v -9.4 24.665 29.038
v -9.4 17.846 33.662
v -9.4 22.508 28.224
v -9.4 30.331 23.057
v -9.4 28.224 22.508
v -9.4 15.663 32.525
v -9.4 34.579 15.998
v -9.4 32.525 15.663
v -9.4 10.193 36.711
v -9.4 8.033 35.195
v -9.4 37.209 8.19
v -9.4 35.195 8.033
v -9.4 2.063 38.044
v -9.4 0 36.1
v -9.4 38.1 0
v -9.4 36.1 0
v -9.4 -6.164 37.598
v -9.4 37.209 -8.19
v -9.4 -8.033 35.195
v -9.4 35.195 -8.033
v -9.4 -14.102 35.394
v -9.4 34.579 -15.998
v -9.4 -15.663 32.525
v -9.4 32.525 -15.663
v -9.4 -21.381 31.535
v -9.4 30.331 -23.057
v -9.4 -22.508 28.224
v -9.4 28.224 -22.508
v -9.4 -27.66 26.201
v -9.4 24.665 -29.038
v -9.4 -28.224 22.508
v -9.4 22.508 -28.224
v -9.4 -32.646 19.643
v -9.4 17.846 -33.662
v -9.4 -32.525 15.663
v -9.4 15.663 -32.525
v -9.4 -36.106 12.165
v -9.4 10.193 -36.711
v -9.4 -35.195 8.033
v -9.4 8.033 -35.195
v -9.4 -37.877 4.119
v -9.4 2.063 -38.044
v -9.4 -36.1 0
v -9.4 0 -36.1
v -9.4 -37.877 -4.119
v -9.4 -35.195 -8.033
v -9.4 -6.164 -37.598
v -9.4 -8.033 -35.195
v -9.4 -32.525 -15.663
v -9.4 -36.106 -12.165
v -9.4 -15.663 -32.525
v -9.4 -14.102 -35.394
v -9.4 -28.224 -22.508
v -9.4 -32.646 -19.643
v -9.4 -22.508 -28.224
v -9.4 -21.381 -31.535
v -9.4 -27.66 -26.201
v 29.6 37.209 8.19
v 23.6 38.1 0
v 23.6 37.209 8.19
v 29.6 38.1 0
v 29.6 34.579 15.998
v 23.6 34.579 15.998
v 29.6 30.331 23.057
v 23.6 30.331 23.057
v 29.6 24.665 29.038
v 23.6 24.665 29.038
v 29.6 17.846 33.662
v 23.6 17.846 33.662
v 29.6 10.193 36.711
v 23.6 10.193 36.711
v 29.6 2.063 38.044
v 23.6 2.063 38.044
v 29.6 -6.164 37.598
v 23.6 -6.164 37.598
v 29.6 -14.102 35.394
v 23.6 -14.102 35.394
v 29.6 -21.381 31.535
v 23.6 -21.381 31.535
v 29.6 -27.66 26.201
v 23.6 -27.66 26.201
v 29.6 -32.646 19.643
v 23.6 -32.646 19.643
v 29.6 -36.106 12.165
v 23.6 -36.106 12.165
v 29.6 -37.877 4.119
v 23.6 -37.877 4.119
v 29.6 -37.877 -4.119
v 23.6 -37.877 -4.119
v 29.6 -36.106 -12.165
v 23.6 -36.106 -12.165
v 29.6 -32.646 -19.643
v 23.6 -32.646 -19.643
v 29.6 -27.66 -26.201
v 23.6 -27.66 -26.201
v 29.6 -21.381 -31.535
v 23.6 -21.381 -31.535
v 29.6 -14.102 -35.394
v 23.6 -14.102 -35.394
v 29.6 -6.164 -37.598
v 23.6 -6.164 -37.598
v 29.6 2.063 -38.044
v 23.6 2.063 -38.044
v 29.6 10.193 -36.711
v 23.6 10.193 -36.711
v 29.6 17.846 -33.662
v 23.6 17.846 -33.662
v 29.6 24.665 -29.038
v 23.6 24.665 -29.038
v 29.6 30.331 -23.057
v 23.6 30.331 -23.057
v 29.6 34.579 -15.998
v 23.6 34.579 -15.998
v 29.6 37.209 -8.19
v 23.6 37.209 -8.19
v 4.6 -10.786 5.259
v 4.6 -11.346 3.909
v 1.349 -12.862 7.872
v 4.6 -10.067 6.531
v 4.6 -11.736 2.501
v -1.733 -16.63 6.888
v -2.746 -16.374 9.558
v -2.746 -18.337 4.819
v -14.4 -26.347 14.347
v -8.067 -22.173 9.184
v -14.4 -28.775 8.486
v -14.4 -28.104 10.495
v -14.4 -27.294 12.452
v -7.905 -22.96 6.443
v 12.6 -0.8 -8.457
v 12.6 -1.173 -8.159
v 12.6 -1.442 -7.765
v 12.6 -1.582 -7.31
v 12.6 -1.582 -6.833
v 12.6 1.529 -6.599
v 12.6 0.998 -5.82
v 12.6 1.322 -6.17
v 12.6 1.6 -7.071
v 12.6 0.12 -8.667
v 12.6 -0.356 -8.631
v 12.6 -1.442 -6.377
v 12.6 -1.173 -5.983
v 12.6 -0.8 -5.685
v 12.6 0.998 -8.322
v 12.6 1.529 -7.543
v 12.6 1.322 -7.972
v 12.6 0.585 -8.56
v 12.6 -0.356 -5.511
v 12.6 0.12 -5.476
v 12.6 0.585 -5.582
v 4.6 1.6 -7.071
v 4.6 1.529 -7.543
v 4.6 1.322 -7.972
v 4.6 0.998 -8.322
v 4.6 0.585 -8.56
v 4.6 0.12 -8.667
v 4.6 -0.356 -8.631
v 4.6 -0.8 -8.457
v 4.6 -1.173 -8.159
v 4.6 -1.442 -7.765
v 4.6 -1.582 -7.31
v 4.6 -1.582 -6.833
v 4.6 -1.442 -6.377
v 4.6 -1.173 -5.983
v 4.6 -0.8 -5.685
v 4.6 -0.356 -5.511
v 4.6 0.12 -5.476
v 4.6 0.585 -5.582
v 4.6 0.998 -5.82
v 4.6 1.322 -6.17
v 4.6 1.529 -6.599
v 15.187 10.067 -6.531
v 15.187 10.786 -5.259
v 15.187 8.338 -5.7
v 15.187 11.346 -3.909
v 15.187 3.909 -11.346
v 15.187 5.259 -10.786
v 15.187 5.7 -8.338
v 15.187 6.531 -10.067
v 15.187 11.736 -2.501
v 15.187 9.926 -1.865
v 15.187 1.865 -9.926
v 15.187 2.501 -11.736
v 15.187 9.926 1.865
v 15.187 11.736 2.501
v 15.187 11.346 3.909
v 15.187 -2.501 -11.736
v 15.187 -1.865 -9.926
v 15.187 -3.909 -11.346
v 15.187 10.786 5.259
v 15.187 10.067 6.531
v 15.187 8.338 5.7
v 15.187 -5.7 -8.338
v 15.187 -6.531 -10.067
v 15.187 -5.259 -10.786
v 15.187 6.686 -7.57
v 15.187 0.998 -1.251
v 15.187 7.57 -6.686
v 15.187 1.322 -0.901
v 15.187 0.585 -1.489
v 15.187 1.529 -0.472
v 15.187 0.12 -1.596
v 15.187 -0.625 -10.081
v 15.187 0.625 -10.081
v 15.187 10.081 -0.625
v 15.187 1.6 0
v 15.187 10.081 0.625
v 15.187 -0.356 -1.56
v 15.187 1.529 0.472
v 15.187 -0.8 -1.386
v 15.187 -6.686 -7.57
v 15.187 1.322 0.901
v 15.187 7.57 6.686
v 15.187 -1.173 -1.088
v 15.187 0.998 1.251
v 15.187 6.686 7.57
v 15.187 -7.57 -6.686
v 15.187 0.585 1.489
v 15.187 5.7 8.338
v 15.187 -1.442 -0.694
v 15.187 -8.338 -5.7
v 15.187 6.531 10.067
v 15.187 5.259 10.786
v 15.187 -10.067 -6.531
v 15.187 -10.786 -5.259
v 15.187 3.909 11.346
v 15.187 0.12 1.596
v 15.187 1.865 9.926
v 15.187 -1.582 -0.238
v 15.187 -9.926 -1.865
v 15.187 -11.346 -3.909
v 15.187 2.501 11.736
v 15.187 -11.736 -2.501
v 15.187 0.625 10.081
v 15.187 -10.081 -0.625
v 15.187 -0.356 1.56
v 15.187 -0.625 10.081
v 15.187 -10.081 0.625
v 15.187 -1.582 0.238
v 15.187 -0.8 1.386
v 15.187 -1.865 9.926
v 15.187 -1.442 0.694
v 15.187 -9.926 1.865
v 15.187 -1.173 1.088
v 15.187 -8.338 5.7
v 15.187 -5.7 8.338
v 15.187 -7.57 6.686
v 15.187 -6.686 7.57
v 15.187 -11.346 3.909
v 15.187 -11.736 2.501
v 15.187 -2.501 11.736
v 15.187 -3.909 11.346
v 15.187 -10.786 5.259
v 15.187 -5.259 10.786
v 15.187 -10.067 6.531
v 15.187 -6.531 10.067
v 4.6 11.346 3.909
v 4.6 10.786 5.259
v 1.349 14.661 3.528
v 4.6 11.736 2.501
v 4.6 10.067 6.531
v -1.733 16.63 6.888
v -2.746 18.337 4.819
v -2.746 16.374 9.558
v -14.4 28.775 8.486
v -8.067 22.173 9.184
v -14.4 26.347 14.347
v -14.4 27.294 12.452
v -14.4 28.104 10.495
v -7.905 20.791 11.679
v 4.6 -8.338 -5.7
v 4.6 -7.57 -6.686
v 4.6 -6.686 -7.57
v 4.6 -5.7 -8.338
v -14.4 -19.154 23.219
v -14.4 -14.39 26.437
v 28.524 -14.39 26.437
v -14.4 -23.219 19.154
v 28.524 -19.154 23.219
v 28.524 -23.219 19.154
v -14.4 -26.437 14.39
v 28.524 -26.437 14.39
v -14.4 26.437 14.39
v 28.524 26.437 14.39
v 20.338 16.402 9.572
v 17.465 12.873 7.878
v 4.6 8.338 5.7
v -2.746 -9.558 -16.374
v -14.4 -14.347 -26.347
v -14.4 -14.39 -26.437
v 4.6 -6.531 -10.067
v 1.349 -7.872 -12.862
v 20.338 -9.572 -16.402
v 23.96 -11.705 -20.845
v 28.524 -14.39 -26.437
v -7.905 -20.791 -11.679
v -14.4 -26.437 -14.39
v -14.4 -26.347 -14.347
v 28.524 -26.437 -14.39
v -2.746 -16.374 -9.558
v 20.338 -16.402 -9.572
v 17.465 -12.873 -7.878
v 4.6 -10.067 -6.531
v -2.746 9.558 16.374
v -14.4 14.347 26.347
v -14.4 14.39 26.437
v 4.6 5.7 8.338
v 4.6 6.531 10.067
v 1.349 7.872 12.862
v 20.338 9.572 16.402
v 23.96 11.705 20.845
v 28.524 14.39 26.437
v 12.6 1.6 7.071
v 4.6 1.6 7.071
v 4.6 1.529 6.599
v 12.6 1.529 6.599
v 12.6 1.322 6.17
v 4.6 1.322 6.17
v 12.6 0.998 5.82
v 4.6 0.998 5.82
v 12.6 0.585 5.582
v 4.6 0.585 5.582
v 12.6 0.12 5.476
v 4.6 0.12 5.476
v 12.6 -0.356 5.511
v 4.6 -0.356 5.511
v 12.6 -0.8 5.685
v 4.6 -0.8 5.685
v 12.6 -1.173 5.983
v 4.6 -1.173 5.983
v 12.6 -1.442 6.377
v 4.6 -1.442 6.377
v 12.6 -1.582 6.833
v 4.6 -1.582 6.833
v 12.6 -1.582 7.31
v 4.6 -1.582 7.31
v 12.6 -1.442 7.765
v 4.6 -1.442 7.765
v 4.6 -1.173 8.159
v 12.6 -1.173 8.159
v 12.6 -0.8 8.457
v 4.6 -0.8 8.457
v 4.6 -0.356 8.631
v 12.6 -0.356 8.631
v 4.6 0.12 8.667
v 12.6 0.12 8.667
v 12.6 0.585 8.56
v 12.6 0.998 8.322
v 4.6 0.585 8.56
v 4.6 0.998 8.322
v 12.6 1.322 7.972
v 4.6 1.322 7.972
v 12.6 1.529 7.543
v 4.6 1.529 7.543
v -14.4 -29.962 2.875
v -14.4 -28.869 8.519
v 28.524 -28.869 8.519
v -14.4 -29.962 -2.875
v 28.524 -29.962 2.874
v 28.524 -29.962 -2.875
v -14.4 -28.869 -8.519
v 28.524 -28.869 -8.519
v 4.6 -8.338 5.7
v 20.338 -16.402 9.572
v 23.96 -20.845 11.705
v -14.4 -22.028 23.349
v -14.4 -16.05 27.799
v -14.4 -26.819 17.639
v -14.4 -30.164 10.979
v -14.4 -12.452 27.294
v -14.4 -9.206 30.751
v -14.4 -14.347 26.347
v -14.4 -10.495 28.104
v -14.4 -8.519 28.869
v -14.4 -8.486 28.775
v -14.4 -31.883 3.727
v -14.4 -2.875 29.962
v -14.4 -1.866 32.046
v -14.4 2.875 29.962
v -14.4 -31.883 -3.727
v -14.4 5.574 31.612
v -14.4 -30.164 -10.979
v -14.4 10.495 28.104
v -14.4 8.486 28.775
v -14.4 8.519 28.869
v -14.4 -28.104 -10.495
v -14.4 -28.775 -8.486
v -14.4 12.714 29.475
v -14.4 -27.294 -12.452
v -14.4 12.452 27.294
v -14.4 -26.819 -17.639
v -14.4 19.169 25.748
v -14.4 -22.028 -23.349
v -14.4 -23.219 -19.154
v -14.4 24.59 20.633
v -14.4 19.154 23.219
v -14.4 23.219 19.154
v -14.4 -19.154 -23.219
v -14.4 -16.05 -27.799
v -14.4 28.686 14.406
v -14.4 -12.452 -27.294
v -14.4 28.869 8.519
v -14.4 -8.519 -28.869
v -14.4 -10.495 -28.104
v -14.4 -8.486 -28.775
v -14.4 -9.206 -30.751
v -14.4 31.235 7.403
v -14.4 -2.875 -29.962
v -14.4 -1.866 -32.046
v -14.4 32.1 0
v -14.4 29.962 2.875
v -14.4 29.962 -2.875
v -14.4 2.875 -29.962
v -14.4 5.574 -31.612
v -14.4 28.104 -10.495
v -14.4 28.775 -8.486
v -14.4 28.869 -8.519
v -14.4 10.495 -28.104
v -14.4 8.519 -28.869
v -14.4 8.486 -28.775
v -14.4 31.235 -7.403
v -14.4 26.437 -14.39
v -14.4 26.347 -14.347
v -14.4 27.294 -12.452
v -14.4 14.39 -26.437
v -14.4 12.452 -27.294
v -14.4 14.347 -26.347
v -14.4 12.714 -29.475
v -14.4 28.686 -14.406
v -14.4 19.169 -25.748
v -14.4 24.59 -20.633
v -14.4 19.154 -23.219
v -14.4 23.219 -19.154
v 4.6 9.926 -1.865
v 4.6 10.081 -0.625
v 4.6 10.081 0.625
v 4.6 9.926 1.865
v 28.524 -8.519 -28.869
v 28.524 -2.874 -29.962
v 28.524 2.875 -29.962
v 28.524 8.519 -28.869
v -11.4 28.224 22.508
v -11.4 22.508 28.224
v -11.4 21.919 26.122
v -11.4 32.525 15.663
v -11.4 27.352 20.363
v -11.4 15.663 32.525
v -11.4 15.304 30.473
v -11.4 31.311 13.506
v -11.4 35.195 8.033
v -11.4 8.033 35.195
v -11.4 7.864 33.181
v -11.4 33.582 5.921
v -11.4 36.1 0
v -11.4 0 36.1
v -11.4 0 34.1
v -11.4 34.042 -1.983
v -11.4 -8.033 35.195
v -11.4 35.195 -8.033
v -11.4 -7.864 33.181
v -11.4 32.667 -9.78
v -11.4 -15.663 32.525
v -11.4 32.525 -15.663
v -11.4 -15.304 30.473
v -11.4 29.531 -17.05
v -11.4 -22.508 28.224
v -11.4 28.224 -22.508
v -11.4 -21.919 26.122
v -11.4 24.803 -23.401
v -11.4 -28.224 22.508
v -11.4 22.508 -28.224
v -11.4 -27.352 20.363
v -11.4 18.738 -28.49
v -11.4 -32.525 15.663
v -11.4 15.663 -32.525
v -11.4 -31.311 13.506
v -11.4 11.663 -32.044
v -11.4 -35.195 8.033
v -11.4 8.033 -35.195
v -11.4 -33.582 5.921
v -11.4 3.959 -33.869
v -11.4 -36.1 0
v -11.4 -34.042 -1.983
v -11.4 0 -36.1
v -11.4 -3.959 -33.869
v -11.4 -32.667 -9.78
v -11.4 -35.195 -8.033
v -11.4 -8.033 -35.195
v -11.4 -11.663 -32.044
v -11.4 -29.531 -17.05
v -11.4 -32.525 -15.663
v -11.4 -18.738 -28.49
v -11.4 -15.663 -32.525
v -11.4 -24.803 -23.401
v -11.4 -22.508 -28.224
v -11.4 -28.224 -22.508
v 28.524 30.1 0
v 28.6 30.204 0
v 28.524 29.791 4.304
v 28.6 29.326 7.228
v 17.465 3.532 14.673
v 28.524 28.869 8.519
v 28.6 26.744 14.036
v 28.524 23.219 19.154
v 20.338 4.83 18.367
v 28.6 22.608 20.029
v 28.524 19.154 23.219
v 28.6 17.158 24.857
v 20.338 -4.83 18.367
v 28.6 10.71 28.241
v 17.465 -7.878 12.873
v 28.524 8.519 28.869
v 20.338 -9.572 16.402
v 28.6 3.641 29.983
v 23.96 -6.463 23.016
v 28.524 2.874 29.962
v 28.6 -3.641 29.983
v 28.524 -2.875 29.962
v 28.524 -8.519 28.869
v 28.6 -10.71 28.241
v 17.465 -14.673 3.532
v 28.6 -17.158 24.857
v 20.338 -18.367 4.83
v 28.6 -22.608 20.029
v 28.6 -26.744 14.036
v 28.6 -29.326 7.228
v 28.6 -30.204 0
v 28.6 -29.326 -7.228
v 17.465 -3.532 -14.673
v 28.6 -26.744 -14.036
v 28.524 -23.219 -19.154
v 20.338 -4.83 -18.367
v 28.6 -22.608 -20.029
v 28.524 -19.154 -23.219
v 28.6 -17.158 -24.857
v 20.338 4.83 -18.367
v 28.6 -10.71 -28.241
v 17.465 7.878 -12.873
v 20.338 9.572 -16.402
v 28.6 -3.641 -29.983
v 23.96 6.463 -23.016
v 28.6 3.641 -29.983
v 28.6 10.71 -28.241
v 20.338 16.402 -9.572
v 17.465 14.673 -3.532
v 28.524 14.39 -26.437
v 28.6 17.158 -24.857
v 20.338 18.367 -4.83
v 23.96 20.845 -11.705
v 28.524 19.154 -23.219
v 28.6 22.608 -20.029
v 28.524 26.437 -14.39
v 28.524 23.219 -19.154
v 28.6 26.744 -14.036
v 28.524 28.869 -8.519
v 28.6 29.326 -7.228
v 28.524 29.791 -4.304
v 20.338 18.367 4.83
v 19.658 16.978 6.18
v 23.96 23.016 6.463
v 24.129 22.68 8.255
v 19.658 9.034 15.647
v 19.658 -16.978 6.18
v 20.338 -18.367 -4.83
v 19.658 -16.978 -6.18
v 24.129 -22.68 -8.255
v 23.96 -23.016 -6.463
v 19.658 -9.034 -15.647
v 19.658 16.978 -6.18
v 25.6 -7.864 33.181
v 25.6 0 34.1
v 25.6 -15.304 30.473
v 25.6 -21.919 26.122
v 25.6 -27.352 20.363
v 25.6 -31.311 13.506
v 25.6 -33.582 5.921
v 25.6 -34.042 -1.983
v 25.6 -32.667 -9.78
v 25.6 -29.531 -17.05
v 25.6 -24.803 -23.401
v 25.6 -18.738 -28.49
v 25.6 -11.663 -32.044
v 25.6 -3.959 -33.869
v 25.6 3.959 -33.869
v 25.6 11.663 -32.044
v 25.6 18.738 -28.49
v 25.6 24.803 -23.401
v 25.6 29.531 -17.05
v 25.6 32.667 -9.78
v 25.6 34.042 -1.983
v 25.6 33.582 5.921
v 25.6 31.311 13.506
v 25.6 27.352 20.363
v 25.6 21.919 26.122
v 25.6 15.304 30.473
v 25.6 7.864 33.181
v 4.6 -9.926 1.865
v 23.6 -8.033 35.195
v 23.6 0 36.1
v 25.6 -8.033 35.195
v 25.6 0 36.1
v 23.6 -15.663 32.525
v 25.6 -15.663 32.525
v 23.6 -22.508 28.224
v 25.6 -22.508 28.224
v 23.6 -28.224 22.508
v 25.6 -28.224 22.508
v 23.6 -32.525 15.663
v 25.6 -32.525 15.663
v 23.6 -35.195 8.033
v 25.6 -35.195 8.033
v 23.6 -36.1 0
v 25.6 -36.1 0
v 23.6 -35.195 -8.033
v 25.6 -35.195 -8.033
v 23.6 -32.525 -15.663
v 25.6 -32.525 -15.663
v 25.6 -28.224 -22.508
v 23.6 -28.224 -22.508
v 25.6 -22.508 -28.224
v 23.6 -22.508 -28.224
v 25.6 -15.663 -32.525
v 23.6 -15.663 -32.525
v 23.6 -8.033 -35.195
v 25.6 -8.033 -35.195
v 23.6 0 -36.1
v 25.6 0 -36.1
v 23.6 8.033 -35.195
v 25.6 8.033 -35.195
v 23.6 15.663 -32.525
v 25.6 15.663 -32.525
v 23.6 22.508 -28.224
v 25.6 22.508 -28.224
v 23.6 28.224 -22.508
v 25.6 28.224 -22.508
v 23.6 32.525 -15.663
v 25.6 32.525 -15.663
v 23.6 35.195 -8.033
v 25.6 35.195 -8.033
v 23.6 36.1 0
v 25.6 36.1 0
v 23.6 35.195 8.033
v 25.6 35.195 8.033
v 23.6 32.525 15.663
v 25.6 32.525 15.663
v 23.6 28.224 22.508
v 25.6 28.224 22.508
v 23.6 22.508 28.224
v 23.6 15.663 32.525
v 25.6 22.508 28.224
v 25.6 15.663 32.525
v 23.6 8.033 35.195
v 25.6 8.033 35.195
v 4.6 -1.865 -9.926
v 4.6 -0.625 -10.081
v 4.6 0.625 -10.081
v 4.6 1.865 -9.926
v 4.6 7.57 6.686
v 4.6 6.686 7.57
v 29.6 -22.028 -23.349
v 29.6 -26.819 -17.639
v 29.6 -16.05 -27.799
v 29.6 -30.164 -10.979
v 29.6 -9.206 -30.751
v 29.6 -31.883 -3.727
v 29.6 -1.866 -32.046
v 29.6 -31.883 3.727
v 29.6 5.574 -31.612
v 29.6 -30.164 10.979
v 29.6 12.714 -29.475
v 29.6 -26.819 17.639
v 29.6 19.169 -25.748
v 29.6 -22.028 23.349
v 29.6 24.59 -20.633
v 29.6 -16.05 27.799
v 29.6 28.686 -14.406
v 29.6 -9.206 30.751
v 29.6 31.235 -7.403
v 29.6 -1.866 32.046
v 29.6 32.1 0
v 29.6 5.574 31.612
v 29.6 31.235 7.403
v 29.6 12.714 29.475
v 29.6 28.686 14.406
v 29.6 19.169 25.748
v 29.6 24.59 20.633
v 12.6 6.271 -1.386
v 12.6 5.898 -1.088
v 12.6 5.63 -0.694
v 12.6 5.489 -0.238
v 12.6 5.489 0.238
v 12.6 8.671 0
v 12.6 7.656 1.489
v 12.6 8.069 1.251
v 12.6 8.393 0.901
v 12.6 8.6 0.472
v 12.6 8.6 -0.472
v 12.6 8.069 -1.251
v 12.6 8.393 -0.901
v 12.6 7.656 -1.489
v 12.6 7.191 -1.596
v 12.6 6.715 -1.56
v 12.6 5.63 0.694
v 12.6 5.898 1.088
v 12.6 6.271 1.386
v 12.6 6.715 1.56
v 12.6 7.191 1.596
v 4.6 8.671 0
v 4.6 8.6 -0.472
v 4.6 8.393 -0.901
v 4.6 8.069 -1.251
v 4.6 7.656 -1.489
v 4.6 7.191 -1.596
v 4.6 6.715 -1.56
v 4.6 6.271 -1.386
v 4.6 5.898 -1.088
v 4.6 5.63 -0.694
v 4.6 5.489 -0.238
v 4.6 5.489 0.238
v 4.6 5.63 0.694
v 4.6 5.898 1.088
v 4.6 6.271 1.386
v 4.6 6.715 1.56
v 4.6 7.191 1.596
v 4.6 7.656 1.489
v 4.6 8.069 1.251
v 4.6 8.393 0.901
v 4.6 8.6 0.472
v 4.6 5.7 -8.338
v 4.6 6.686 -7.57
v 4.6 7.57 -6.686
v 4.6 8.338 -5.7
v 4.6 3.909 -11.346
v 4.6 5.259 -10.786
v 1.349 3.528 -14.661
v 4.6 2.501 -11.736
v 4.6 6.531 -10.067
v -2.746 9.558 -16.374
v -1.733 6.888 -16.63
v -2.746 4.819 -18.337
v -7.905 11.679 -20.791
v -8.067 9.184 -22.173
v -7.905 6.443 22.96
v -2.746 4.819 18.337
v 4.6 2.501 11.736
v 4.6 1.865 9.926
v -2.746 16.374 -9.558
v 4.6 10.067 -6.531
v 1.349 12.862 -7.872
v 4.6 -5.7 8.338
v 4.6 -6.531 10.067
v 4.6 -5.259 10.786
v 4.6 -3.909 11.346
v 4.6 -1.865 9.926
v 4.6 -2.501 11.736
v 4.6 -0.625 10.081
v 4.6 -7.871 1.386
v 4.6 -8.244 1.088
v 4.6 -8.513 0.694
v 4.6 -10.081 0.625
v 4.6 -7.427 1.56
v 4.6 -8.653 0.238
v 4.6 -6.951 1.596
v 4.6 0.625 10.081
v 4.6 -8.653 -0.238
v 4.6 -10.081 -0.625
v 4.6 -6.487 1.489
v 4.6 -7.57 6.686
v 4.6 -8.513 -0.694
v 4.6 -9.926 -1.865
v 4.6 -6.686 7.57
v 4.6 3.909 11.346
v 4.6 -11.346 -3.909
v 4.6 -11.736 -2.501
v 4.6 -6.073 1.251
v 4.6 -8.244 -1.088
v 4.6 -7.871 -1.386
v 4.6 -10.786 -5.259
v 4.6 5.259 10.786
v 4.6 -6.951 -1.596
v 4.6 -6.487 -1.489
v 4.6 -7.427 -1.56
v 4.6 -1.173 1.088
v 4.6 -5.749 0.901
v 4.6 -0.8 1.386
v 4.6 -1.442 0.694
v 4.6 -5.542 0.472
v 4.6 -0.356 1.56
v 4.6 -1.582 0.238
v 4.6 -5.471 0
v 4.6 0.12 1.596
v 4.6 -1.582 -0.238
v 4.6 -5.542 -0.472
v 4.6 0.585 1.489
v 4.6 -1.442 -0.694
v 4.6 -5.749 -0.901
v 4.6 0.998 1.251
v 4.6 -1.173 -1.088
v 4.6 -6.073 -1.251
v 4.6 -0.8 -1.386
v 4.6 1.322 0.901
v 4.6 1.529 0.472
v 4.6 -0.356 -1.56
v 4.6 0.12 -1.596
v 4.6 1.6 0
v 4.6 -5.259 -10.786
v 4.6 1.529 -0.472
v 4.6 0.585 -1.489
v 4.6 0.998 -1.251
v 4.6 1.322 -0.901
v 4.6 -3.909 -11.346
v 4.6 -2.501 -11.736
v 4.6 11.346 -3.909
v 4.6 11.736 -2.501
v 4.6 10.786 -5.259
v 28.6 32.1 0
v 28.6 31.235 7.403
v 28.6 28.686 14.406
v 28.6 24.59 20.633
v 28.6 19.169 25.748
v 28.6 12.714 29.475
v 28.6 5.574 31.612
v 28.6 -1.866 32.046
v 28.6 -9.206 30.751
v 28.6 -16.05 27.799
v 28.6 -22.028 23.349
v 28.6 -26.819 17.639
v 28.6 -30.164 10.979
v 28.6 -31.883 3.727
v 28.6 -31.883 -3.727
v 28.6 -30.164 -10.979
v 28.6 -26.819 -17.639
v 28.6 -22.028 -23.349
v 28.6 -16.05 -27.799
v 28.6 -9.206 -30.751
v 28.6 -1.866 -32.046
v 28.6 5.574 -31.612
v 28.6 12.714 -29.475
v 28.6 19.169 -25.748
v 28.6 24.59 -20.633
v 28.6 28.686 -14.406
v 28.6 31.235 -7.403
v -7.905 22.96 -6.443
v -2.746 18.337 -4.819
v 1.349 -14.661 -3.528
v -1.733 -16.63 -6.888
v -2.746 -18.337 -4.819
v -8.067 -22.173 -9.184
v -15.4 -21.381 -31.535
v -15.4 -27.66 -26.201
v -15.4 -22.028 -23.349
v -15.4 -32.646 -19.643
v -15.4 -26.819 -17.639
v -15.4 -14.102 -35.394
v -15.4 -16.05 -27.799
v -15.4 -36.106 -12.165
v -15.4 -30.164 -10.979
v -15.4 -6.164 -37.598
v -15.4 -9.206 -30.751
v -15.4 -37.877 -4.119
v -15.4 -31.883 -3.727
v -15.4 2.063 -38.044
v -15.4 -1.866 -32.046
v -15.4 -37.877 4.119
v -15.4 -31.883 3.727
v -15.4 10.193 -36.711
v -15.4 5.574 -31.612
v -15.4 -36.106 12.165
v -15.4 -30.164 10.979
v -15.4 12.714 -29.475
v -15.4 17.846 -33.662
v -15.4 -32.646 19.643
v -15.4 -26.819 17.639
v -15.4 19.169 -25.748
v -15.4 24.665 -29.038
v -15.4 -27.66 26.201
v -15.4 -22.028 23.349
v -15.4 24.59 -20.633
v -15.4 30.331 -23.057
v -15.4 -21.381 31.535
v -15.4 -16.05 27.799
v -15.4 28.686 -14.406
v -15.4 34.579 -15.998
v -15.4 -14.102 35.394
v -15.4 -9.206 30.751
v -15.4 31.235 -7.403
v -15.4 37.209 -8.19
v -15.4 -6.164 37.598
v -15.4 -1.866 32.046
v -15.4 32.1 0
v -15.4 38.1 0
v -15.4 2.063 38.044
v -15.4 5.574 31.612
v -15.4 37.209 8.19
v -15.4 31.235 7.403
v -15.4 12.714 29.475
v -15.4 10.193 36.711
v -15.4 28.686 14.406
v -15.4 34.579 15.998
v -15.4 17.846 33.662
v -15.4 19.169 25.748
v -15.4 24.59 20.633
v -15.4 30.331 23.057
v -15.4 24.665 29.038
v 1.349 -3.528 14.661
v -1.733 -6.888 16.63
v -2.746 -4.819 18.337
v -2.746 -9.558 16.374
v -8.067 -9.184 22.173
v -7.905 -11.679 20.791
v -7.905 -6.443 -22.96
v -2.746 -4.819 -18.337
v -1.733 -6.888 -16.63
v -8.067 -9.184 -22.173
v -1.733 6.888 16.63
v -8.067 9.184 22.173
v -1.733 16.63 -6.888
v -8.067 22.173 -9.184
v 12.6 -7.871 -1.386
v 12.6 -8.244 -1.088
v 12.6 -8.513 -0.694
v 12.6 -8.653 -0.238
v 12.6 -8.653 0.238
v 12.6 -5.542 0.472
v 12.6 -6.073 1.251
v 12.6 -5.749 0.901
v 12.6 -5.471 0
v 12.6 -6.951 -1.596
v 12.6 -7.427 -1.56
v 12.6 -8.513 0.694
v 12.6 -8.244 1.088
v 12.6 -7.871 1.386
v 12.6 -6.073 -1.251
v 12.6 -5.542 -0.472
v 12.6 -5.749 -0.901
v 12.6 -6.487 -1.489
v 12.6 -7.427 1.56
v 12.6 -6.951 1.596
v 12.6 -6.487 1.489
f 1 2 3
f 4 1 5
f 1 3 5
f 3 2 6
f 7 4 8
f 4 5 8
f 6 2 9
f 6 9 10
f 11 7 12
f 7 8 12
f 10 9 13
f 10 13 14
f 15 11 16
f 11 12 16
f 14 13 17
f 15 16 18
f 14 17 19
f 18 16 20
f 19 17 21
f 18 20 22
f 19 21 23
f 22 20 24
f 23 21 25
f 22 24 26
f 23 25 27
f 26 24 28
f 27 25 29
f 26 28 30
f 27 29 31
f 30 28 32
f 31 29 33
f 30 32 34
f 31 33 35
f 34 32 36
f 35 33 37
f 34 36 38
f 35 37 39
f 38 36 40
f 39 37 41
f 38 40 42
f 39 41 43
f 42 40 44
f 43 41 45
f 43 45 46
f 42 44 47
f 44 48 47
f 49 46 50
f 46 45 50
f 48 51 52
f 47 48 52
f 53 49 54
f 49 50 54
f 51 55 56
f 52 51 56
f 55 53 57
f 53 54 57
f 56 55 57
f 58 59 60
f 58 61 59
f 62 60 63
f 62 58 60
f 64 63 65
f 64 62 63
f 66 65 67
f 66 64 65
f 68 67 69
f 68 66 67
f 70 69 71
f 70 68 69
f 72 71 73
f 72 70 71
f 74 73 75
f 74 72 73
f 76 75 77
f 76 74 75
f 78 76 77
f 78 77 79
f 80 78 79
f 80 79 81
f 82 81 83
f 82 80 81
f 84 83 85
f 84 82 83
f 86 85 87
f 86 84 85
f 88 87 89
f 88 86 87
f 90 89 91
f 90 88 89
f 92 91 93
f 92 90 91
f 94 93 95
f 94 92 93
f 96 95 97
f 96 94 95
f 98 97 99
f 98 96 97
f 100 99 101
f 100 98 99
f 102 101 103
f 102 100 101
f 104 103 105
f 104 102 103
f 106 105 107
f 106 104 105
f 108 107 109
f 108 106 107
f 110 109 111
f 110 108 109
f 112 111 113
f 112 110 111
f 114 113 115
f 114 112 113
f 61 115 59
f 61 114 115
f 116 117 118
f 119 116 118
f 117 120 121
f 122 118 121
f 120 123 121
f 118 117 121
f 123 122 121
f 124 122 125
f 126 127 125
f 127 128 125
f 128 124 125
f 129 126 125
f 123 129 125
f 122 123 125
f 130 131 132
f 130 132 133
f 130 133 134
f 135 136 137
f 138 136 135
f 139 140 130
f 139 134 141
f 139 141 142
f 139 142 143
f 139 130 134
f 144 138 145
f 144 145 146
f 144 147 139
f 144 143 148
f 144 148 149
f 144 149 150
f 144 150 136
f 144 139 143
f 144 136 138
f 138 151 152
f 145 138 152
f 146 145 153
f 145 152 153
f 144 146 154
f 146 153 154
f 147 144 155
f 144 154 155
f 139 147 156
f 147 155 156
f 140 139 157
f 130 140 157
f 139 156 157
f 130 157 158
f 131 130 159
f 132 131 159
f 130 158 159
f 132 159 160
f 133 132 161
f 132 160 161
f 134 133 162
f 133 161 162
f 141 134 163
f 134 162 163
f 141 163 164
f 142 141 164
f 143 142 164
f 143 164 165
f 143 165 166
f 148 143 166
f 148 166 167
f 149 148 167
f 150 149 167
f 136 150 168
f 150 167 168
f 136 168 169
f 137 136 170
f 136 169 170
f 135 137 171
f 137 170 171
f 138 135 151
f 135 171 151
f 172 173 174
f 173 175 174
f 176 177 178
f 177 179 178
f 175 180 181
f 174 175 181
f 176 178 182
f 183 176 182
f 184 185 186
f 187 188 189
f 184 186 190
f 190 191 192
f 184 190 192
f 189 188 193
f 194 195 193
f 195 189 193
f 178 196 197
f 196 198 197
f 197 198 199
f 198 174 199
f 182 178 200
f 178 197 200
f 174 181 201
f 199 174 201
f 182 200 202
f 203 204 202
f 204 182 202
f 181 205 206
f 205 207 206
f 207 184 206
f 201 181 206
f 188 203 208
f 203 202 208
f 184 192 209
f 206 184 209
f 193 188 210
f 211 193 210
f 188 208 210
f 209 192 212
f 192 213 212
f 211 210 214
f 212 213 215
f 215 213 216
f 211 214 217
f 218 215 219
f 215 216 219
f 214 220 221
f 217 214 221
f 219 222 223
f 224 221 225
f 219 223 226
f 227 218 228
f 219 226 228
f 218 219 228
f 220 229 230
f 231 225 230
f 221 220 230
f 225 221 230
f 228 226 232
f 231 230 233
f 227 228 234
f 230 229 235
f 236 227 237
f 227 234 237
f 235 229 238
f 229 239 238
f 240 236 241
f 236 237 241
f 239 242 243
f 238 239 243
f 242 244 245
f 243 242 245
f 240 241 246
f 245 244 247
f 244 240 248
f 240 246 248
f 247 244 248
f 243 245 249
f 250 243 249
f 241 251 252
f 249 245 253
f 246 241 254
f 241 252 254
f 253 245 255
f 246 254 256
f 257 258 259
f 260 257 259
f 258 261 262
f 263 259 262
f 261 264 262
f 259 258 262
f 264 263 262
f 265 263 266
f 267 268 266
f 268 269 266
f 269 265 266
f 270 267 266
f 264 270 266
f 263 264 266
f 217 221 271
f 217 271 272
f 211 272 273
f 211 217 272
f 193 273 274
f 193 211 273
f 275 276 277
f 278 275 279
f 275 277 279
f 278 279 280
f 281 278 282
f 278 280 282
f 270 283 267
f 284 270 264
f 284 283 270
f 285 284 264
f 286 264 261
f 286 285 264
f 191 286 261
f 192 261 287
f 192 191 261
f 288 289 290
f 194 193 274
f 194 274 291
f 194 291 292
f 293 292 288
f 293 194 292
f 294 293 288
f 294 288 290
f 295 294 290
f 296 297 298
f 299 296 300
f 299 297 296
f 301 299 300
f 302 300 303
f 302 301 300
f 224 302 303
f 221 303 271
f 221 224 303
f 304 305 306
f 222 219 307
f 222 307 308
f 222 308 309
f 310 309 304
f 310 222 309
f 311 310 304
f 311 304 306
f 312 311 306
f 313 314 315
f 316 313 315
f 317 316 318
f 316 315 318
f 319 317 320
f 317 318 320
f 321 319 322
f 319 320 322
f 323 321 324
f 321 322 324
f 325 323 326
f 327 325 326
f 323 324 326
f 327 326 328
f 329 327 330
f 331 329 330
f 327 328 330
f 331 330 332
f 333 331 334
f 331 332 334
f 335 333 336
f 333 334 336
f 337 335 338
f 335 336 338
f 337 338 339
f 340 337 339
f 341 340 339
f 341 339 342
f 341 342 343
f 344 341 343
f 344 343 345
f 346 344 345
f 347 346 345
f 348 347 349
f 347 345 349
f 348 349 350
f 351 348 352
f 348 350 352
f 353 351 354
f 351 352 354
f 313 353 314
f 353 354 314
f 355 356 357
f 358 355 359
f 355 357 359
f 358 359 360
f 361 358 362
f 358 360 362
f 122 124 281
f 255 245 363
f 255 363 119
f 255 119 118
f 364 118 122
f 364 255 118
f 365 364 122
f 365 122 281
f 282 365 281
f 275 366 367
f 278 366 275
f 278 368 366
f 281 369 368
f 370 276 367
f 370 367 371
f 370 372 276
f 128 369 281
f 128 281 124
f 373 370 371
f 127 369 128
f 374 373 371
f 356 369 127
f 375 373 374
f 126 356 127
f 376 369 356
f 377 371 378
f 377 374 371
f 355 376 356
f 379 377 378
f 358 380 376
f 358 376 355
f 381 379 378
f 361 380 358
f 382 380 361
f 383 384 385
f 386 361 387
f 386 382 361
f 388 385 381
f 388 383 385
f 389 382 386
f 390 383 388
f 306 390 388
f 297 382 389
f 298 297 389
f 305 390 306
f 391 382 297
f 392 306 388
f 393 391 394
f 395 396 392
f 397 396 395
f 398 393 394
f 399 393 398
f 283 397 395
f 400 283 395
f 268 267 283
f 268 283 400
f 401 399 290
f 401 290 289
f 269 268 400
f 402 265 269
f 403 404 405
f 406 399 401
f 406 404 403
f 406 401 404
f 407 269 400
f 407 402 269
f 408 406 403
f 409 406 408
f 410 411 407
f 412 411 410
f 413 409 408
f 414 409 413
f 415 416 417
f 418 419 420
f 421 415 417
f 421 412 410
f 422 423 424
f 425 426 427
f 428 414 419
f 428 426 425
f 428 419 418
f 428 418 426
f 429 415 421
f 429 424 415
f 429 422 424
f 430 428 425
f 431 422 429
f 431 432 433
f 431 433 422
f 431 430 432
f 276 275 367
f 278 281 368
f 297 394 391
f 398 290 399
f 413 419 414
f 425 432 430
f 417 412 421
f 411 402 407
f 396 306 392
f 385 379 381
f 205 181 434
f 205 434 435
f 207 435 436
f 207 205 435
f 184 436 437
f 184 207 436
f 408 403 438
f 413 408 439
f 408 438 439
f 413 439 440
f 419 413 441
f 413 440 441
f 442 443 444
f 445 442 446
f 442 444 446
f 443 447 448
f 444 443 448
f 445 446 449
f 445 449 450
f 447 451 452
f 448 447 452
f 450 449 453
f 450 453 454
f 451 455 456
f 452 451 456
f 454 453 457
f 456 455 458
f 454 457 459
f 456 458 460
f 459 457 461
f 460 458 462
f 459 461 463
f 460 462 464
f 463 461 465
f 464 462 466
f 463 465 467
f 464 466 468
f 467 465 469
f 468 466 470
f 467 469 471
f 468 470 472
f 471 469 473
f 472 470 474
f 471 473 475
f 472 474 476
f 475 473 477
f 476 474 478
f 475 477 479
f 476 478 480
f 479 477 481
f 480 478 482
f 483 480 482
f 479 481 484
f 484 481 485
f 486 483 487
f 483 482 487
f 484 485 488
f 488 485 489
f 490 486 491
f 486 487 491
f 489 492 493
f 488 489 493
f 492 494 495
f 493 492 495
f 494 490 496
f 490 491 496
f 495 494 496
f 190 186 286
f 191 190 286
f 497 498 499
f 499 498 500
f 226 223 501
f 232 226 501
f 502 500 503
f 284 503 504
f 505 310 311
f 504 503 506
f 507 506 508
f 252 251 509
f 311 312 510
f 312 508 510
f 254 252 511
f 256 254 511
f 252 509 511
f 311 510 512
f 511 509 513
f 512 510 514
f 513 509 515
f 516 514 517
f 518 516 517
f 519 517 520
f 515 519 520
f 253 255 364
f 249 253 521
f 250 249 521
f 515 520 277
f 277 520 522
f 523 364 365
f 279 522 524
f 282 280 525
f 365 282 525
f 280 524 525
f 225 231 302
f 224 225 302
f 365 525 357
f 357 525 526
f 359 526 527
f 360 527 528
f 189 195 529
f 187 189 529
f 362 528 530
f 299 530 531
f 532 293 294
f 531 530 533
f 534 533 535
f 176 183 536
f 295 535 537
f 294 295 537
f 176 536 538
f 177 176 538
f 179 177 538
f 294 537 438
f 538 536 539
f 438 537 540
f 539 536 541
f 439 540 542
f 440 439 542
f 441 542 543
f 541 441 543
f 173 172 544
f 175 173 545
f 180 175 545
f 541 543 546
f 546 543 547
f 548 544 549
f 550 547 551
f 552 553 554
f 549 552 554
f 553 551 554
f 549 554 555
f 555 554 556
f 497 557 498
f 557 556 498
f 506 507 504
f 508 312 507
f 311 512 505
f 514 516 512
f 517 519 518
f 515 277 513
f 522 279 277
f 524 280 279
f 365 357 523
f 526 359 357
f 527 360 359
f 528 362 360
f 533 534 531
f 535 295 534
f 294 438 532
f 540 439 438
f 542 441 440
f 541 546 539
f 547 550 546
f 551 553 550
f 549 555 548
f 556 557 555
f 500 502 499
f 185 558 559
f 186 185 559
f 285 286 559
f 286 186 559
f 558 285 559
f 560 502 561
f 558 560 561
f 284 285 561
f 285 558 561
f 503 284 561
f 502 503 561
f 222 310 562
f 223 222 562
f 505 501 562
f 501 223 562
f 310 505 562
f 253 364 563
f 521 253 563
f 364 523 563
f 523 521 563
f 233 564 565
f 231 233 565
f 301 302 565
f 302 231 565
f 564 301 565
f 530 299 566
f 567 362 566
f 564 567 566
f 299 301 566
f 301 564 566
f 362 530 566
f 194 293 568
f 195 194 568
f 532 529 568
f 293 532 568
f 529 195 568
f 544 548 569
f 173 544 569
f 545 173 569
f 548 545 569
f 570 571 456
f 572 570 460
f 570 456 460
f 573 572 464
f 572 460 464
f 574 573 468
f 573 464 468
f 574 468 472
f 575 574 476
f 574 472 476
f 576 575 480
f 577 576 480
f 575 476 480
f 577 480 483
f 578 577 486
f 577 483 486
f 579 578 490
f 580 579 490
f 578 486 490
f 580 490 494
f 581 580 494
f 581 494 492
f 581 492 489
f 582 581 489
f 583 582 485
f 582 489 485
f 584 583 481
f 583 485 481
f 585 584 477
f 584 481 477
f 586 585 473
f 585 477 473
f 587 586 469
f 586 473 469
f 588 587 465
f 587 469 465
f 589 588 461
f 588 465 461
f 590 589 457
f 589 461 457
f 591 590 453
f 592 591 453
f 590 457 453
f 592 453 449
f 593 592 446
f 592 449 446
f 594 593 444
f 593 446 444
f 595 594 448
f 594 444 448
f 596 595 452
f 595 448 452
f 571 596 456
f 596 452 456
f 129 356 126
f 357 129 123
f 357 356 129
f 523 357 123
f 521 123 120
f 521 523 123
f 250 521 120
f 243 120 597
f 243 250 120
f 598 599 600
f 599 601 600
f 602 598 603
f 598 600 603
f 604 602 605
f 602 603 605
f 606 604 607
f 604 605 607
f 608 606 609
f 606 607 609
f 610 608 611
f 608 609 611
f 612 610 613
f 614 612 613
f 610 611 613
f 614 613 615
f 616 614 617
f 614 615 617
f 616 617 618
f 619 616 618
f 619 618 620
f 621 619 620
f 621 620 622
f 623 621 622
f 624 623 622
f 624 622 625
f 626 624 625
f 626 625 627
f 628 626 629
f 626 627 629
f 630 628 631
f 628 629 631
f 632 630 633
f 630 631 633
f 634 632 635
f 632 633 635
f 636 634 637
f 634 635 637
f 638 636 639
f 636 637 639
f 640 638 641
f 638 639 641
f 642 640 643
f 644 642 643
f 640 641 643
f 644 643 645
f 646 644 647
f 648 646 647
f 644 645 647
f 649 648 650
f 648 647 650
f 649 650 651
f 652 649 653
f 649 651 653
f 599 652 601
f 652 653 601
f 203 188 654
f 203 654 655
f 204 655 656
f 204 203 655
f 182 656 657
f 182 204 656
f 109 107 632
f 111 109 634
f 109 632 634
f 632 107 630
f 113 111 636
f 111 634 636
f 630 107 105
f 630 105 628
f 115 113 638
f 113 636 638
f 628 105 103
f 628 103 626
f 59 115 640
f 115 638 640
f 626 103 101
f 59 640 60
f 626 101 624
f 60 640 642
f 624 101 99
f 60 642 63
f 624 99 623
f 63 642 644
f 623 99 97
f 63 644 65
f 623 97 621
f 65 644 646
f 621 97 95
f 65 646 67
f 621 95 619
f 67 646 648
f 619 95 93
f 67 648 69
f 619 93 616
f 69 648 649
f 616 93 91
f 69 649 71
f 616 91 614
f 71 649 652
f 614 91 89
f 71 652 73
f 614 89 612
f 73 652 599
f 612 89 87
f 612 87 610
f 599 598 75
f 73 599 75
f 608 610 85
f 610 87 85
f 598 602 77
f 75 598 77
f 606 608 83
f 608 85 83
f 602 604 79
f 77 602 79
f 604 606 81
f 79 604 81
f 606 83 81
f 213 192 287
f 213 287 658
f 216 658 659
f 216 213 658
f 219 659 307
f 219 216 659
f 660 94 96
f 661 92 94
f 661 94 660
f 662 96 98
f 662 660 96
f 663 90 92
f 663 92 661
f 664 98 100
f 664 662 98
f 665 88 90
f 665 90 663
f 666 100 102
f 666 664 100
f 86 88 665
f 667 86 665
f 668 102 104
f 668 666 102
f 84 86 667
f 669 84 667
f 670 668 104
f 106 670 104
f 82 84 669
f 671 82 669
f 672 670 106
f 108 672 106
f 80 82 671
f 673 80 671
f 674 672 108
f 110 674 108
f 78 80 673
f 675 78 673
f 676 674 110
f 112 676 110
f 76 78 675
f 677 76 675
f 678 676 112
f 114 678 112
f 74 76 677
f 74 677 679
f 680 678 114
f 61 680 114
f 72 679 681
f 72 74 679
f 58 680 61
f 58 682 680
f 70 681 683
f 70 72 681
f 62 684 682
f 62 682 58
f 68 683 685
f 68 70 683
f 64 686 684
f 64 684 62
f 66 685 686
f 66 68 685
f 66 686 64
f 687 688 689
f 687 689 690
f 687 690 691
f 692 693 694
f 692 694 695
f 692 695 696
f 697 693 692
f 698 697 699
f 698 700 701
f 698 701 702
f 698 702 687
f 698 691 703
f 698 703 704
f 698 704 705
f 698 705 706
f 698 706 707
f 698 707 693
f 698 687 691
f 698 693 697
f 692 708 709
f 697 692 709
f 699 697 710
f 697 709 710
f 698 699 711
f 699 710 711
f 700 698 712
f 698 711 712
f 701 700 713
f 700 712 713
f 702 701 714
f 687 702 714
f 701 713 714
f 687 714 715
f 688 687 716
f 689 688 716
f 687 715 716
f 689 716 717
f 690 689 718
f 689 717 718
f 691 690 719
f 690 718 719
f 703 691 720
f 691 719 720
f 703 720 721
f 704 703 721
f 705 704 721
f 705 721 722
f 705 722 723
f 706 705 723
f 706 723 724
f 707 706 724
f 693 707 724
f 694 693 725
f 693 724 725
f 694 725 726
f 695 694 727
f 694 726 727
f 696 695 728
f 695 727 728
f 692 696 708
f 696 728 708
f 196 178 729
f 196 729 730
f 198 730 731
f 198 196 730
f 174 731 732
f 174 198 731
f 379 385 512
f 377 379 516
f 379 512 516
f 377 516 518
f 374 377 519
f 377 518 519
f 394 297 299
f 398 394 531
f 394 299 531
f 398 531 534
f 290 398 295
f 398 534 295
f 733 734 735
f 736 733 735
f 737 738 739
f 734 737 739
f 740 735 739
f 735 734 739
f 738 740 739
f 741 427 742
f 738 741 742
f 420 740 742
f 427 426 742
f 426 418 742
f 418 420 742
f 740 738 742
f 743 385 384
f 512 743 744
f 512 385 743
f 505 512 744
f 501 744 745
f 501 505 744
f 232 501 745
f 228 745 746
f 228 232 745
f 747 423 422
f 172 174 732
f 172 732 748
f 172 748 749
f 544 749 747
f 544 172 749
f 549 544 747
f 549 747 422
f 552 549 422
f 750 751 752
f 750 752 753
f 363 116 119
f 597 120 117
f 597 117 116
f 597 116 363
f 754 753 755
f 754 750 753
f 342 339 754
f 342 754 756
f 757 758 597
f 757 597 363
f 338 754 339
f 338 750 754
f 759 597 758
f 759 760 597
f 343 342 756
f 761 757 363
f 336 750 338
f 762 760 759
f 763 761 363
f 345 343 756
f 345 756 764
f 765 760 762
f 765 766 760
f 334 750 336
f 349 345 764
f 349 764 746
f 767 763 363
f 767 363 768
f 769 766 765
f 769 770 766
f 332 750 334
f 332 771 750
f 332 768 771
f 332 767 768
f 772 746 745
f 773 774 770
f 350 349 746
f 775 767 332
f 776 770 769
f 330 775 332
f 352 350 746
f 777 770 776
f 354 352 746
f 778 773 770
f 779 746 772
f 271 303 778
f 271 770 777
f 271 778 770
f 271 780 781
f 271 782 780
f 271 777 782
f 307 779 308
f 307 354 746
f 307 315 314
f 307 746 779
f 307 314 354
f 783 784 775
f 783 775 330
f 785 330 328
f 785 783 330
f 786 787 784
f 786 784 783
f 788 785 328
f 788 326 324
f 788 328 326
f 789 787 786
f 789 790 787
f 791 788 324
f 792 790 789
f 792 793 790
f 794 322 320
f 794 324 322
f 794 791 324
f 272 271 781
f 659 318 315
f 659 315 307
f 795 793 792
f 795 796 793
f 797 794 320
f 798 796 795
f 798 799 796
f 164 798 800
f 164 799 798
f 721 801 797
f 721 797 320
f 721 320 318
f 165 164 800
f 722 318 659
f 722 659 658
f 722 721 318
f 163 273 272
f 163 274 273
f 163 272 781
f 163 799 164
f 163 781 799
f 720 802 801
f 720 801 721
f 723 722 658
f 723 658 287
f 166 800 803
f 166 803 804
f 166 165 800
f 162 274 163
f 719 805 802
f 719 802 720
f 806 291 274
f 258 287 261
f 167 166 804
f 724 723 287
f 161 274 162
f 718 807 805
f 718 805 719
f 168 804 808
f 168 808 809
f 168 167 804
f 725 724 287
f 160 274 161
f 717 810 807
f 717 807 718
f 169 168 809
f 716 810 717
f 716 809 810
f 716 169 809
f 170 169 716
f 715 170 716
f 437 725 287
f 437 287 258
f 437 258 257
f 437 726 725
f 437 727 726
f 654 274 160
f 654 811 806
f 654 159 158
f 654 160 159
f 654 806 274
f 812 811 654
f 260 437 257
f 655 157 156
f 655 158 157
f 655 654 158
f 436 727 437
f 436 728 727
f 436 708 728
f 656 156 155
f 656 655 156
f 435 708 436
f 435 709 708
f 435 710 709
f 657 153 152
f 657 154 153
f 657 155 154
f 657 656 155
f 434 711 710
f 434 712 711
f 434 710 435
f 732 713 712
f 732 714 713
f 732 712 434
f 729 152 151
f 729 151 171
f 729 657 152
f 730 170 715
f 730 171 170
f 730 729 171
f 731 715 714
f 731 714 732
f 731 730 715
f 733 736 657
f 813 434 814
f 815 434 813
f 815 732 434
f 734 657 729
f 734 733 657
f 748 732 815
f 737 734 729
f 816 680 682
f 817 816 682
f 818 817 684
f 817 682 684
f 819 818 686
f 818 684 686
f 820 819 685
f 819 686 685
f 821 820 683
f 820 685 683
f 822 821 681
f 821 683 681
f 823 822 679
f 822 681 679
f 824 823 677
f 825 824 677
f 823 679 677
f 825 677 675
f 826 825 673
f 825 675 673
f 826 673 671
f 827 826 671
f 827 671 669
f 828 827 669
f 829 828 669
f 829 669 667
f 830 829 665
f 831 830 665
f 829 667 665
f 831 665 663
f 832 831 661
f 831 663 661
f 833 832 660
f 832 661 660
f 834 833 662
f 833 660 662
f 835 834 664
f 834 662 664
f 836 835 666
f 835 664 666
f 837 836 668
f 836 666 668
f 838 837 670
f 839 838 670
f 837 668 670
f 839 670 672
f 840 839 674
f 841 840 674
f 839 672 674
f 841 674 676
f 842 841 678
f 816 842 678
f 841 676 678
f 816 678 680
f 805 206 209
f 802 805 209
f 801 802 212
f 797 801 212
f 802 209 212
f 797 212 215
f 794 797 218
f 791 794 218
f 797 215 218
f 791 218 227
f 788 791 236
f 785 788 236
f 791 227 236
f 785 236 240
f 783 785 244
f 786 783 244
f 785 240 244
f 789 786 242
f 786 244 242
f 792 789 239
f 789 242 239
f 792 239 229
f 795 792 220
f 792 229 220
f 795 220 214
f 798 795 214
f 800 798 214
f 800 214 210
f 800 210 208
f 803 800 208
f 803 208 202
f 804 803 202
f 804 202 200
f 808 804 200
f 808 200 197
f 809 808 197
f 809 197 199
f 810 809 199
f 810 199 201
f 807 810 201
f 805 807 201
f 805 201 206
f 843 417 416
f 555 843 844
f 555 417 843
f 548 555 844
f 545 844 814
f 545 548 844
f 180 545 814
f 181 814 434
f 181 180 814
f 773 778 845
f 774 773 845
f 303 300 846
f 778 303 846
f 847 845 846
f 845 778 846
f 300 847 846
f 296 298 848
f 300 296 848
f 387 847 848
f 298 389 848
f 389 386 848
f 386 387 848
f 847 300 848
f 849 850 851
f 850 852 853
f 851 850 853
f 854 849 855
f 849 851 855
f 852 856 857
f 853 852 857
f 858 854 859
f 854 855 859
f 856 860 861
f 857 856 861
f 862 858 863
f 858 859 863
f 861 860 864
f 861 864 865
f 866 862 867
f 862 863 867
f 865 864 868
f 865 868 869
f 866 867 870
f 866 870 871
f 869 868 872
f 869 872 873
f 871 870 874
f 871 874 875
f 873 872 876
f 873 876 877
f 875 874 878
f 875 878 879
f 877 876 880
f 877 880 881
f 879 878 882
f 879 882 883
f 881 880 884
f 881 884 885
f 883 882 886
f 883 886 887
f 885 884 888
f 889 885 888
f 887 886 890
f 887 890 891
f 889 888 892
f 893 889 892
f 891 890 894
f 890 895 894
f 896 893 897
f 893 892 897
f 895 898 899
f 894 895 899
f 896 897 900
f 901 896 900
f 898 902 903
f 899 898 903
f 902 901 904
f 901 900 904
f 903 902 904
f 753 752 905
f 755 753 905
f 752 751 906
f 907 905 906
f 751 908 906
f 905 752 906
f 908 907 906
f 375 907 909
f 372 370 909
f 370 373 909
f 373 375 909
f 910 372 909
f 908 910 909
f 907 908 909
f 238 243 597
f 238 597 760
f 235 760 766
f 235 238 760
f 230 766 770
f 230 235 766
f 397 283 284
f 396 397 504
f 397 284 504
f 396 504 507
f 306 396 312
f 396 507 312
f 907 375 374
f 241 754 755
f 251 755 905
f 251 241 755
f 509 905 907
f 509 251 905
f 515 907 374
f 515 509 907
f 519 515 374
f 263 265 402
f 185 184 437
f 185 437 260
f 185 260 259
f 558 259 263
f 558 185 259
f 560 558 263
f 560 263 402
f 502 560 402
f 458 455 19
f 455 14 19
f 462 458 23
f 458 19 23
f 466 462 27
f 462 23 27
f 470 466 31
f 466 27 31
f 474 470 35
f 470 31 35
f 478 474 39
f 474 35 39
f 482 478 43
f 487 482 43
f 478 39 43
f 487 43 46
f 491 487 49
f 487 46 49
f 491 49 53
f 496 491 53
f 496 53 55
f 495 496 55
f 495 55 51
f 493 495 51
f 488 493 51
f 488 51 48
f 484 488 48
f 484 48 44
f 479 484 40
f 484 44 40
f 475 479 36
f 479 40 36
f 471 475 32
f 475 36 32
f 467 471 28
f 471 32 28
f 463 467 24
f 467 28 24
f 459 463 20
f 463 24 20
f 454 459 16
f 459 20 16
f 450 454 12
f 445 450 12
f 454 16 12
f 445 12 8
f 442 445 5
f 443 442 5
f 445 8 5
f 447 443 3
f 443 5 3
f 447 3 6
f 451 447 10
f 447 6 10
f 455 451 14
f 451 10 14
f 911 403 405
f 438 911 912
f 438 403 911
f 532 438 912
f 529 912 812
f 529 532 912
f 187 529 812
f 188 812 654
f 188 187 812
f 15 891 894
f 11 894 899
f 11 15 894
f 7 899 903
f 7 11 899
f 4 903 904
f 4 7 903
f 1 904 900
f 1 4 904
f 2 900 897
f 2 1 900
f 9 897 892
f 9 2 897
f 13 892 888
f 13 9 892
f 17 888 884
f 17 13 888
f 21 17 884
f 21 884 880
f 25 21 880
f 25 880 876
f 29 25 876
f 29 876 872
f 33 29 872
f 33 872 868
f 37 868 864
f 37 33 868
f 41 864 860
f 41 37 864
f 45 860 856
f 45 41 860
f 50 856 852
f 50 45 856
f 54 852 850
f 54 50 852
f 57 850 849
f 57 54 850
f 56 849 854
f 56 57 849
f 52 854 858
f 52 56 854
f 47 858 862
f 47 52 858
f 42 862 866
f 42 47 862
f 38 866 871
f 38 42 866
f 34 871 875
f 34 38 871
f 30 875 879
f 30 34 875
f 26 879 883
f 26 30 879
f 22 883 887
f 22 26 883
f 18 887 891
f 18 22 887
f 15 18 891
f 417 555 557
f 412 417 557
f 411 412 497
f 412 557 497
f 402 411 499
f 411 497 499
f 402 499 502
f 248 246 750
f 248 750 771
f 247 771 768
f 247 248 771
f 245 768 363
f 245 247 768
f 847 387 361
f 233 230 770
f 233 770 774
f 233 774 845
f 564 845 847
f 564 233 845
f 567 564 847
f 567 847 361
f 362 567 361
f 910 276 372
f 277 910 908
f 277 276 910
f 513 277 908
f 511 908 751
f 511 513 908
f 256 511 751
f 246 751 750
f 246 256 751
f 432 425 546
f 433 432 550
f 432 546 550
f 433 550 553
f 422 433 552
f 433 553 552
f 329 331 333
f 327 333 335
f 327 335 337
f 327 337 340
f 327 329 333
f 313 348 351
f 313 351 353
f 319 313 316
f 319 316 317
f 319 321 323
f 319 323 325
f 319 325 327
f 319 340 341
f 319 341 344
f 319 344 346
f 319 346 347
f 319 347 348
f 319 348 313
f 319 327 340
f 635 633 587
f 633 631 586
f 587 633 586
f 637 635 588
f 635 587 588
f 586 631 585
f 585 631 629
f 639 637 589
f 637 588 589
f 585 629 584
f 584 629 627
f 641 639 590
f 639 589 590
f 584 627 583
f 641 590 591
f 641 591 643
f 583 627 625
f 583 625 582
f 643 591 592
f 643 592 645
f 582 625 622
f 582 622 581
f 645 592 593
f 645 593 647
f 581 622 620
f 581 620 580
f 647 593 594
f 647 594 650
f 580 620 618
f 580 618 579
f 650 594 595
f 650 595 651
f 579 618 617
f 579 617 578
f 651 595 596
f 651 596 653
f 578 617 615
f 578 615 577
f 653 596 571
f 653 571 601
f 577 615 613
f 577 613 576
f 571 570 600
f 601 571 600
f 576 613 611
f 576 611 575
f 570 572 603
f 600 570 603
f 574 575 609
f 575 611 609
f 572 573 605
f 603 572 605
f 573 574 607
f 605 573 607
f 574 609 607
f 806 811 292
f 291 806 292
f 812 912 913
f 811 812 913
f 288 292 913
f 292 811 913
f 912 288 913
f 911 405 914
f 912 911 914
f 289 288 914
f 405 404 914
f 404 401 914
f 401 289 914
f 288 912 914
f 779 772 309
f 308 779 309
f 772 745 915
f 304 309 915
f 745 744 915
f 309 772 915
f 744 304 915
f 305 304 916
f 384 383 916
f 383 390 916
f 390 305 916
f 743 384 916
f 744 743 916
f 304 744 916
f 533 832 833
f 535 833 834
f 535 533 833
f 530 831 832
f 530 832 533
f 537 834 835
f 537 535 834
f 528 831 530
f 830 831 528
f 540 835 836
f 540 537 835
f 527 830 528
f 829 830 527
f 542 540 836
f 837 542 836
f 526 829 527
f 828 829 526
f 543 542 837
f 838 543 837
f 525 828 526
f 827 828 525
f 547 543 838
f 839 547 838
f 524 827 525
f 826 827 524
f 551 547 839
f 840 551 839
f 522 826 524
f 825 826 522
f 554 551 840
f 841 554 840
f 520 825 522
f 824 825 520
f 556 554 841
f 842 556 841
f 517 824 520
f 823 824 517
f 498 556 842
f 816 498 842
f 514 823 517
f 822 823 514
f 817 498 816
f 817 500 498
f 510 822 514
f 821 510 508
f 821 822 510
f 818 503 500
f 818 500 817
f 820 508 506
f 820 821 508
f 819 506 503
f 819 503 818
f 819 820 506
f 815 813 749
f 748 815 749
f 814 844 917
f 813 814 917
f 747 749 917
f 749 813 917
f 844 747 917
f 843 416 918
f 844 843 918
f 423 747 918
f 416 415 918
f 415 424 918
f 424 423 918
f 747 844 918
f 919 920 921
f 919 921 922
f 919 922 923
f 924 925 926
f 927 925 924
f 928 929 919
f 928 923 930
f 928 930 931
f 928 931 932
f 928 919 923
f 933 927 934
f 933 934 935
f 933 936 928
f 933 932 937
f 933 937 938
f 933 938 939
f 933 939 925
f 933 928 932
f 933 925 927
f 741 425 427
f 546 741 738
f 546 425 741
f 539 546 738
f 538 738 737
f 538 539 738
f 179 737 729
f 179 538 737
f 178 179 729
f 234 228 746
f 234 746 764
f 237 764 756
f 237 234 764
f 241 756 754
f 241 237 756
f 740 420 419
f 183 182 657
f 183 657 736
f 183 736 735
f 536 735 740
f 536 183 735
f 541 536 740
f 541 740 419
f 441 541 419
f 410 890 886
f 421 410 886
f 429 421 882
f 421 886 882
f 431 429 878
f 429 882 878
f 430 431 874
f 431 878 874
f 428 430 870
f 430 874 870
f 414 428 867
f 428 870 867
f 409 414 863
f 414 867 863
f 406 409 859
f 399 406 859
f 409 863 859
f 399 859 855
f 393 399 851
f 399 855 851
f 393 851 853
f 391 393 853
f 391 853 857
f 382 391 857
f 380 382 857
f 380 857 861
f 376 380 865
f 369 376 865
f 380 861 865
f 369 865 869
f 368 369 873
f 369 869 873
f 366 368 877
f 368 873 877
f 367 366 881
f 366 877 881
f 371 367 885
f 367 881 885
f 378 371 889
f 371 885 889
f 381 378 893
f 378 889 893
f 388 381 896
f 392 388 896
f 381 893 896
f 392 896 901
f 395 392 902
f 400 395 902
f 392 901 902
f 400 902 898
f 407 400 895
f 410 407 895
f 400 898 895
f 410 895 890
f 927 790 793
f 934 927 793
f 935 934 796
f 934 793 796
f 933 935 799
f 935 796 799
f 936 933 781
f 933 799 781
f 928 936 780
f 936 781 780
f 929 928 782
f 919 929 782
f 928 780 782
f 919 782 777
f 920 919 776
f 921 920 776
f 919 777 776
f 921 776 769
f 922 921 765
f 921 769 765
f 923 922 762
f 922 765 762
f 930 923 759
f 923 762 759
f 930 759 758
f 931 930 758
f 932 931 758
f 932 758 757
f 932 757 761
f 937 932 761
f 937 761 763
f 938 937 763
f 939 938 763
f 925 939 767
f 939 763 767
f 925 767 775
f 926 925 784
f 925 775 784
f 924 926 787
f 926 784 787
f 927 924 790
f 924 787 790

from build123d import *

# Parameters (mm, degrees)
SKETCH027_R          = 38.1
PAD009_DEPTH         = 22.5
POCKET015_DEPTH      = 278.563668
POCKET015_DEPTH_BACK = -233.563668
POLARPATTERN_COUNT   = 8
SKETCH029_R          = 1.6
POCKET016_DEPTH      = 45.001
POCKET016_DEPTH_BACK = -0.001
SKETCH030_R          = 32.1
POCKET017_DEPTH      = 1
SKETCH031_R          = 12
POCKET018_DEPTH      = 19
SKETCH034_R          = 32.1
POCKET019_DEPTH      = 1
SKETCH035_R          = 8
POCKET020_DEPTH      = 13
SKETCH069_R          = 1.6
POCKET040_DEPTH      = 8


with BuildPart() as part:
    # Sketch027 → Pad009 (new body, symmetric)
    with BuildSketch(Plane.YZ):
        Circle(SKETCH027_R)
    extrude(amount=PAD009_DEPTH, both=True)

    # Sketch028 (on Face3 of Pad009) → Pocket015 (cut, two sides)
    with BuildSketch(Plane.YZ.offset(22.5)) as pocket015_sk:
        with BuildLine():
            ThreePointArc((1.865103, 9.926298), (0, 10.1), (-1.865103, 9.926298))
            Line((-1.865103, 9.926298), (-8.518771, 28.86937))
            ThreePointArc((8.518771, 28.86937), (0, 30.1), (-8.518771, 28.86937))
            Line((8.518771, 28.86937), (1.865103, 9.926298))
        make_face()
    pocket015 = extrude(amount=-POCKET015_DEPTH, mode=Mode.SUBTRACT)
    extrude(pocket015_sk.sketch, amount=-POCKET015_DEPTH_BACK, mode=Mode.SUBTRACT)

    # PolarPattern: Pocket015 ×8 about axis
    polarpattern_axis = Axis((22.5, 0, 0), (1, 0, 0))
    for i in range(1, POLARPATTERN_COUNT):
        add(pocket015.rotate(polarpattern_axis, i * 360 / POLARPATTERN_COUNT), mode=Mode.SUBTRACT)

    # Sketch029 (on Face3 of PolarPattern) → Pocket016 (cut, two sides)
    with BuildSketch(Plane.YZ.offset(22.5)) as pocket016_sk:
        Circle(SKETCH029_R)
    extrude(amount=-POCKET016_DEPTH, mode=Mode.SUBTRACT)
    extrude(pocket016_sk.sketch, amount=-POCKET016_DEPTH_BACK, mode=Mode.SUBTRACT)

    # Sketch030 (on Face2 of Pocket016) → Pocket017 (cut)
    with BuildSketch(Plane(origin=(-22.5, 0, 0), x_dir=(0, 1, 0), z_dir=(-1, 0, 0))):
        Circle(SKETCH030_R)
    extrude(amount=-POCKET017_DEPTH, mode=Mode.SUBTRACT)

    # Sketch031 (on Face38 of Pocket017) → Pocket018 (cut)
    with BuildSketch(Plane(origin=(-21.5, 0, 0), x_dir=(0, 1, 0), z_dir=(-1, 0, 0))):
        Circle(SKETCH031_R)
    extrude(amount=-POCKET018_DEPTH, mode=Mode.SUBTRACT)

    # Sketch033 → Groove (revolve, cut)
    with BuildSketch(Plane.XZ):
        Polygon((-16.5, 38.1), (16.5, 38.1), (16.5, 36.1), (18.5, 36.1), (18.5, 34.1), (-18.5, 34.1), (-18.5, 36.1), (-16.5, 36.1), align=None)
    revolve(axis=Axis((0, 0, 0), (1, 0, 0)), mode=Mode.SUBTRACT)

    # Sketch034 (on Face41 of Groove) → Pocket019 (cut)
    with BuildSketch(Plane.YZ.offset(22.5)):
        Circle(SKETCH034_R)
    extrude(amount=-POCKET019_DEPTH, mode=Mode.SUBTRACT)

    # Sketch035 (on Face41 of Pocket019) → Pocket020 (cut)
    with BuildSketch(Plane.YZ.offset(21.5)):
        Circle(SKETCH035_R)
    extrude(amount=-POCKET020_DEPTH, mode=Mode.SUBTRACT)

    # Cone → Cone (revolve, cut)
    with BuildSketch(Plane(origin=(8.086737, 0, 0), x_dir=(0, 1, 0), z_dir=(0, 0, -1))):
        Polygon((0, 0), (12, 0), (31, 14), (0, 14), align=None)
    revolve(axis=Axis((8.086737, 0, 0), (1, 0, 0)), mode=Mode.SUBTRACT)

    # Cone001 → Cone001 (revolve, cut)
    with BuildSketch(Plane(origin=(-2.5, 0, 0), x_dir=(0, 1, 0), z_dir=(0, 0, 1))):
        Polygon((0, 0), (12, 0), (30, 19), (0, 19), align=None)
    revolve(axis=Axis((-2.5, 0, 0), (-1, 0, 0)), mode=Mode.SUBTRACT)

    # Sketch069 (on Face42 of Cone001) → Pocket040 (cut)
    with BuildSketch(Plane(origin=(-2.5, 0, 0), x_dir=(0, 1, 0), z_dir=(-1, 0, 0))):
        with Locations((-7.071068, 0)):
            Circle(SKETCH069_R)
        with Locations((0, 7.071068)):
            Circle(SKETCH069_R)
        with Locations((7.071068, 0)):
            Circle(SKETCH069_R)
        with Locations((0, -7.071068)):
            Circle(SKETCH069_R)
    extrude(amount=-POCKET040_DEPTH, mode=Mode.SUBTRACT)


with BuildPart() as part_1:
    # Body006 placement: moved
    add(part.part.moved(Location((7.1, 0, 0))))


solid = part_1.part
